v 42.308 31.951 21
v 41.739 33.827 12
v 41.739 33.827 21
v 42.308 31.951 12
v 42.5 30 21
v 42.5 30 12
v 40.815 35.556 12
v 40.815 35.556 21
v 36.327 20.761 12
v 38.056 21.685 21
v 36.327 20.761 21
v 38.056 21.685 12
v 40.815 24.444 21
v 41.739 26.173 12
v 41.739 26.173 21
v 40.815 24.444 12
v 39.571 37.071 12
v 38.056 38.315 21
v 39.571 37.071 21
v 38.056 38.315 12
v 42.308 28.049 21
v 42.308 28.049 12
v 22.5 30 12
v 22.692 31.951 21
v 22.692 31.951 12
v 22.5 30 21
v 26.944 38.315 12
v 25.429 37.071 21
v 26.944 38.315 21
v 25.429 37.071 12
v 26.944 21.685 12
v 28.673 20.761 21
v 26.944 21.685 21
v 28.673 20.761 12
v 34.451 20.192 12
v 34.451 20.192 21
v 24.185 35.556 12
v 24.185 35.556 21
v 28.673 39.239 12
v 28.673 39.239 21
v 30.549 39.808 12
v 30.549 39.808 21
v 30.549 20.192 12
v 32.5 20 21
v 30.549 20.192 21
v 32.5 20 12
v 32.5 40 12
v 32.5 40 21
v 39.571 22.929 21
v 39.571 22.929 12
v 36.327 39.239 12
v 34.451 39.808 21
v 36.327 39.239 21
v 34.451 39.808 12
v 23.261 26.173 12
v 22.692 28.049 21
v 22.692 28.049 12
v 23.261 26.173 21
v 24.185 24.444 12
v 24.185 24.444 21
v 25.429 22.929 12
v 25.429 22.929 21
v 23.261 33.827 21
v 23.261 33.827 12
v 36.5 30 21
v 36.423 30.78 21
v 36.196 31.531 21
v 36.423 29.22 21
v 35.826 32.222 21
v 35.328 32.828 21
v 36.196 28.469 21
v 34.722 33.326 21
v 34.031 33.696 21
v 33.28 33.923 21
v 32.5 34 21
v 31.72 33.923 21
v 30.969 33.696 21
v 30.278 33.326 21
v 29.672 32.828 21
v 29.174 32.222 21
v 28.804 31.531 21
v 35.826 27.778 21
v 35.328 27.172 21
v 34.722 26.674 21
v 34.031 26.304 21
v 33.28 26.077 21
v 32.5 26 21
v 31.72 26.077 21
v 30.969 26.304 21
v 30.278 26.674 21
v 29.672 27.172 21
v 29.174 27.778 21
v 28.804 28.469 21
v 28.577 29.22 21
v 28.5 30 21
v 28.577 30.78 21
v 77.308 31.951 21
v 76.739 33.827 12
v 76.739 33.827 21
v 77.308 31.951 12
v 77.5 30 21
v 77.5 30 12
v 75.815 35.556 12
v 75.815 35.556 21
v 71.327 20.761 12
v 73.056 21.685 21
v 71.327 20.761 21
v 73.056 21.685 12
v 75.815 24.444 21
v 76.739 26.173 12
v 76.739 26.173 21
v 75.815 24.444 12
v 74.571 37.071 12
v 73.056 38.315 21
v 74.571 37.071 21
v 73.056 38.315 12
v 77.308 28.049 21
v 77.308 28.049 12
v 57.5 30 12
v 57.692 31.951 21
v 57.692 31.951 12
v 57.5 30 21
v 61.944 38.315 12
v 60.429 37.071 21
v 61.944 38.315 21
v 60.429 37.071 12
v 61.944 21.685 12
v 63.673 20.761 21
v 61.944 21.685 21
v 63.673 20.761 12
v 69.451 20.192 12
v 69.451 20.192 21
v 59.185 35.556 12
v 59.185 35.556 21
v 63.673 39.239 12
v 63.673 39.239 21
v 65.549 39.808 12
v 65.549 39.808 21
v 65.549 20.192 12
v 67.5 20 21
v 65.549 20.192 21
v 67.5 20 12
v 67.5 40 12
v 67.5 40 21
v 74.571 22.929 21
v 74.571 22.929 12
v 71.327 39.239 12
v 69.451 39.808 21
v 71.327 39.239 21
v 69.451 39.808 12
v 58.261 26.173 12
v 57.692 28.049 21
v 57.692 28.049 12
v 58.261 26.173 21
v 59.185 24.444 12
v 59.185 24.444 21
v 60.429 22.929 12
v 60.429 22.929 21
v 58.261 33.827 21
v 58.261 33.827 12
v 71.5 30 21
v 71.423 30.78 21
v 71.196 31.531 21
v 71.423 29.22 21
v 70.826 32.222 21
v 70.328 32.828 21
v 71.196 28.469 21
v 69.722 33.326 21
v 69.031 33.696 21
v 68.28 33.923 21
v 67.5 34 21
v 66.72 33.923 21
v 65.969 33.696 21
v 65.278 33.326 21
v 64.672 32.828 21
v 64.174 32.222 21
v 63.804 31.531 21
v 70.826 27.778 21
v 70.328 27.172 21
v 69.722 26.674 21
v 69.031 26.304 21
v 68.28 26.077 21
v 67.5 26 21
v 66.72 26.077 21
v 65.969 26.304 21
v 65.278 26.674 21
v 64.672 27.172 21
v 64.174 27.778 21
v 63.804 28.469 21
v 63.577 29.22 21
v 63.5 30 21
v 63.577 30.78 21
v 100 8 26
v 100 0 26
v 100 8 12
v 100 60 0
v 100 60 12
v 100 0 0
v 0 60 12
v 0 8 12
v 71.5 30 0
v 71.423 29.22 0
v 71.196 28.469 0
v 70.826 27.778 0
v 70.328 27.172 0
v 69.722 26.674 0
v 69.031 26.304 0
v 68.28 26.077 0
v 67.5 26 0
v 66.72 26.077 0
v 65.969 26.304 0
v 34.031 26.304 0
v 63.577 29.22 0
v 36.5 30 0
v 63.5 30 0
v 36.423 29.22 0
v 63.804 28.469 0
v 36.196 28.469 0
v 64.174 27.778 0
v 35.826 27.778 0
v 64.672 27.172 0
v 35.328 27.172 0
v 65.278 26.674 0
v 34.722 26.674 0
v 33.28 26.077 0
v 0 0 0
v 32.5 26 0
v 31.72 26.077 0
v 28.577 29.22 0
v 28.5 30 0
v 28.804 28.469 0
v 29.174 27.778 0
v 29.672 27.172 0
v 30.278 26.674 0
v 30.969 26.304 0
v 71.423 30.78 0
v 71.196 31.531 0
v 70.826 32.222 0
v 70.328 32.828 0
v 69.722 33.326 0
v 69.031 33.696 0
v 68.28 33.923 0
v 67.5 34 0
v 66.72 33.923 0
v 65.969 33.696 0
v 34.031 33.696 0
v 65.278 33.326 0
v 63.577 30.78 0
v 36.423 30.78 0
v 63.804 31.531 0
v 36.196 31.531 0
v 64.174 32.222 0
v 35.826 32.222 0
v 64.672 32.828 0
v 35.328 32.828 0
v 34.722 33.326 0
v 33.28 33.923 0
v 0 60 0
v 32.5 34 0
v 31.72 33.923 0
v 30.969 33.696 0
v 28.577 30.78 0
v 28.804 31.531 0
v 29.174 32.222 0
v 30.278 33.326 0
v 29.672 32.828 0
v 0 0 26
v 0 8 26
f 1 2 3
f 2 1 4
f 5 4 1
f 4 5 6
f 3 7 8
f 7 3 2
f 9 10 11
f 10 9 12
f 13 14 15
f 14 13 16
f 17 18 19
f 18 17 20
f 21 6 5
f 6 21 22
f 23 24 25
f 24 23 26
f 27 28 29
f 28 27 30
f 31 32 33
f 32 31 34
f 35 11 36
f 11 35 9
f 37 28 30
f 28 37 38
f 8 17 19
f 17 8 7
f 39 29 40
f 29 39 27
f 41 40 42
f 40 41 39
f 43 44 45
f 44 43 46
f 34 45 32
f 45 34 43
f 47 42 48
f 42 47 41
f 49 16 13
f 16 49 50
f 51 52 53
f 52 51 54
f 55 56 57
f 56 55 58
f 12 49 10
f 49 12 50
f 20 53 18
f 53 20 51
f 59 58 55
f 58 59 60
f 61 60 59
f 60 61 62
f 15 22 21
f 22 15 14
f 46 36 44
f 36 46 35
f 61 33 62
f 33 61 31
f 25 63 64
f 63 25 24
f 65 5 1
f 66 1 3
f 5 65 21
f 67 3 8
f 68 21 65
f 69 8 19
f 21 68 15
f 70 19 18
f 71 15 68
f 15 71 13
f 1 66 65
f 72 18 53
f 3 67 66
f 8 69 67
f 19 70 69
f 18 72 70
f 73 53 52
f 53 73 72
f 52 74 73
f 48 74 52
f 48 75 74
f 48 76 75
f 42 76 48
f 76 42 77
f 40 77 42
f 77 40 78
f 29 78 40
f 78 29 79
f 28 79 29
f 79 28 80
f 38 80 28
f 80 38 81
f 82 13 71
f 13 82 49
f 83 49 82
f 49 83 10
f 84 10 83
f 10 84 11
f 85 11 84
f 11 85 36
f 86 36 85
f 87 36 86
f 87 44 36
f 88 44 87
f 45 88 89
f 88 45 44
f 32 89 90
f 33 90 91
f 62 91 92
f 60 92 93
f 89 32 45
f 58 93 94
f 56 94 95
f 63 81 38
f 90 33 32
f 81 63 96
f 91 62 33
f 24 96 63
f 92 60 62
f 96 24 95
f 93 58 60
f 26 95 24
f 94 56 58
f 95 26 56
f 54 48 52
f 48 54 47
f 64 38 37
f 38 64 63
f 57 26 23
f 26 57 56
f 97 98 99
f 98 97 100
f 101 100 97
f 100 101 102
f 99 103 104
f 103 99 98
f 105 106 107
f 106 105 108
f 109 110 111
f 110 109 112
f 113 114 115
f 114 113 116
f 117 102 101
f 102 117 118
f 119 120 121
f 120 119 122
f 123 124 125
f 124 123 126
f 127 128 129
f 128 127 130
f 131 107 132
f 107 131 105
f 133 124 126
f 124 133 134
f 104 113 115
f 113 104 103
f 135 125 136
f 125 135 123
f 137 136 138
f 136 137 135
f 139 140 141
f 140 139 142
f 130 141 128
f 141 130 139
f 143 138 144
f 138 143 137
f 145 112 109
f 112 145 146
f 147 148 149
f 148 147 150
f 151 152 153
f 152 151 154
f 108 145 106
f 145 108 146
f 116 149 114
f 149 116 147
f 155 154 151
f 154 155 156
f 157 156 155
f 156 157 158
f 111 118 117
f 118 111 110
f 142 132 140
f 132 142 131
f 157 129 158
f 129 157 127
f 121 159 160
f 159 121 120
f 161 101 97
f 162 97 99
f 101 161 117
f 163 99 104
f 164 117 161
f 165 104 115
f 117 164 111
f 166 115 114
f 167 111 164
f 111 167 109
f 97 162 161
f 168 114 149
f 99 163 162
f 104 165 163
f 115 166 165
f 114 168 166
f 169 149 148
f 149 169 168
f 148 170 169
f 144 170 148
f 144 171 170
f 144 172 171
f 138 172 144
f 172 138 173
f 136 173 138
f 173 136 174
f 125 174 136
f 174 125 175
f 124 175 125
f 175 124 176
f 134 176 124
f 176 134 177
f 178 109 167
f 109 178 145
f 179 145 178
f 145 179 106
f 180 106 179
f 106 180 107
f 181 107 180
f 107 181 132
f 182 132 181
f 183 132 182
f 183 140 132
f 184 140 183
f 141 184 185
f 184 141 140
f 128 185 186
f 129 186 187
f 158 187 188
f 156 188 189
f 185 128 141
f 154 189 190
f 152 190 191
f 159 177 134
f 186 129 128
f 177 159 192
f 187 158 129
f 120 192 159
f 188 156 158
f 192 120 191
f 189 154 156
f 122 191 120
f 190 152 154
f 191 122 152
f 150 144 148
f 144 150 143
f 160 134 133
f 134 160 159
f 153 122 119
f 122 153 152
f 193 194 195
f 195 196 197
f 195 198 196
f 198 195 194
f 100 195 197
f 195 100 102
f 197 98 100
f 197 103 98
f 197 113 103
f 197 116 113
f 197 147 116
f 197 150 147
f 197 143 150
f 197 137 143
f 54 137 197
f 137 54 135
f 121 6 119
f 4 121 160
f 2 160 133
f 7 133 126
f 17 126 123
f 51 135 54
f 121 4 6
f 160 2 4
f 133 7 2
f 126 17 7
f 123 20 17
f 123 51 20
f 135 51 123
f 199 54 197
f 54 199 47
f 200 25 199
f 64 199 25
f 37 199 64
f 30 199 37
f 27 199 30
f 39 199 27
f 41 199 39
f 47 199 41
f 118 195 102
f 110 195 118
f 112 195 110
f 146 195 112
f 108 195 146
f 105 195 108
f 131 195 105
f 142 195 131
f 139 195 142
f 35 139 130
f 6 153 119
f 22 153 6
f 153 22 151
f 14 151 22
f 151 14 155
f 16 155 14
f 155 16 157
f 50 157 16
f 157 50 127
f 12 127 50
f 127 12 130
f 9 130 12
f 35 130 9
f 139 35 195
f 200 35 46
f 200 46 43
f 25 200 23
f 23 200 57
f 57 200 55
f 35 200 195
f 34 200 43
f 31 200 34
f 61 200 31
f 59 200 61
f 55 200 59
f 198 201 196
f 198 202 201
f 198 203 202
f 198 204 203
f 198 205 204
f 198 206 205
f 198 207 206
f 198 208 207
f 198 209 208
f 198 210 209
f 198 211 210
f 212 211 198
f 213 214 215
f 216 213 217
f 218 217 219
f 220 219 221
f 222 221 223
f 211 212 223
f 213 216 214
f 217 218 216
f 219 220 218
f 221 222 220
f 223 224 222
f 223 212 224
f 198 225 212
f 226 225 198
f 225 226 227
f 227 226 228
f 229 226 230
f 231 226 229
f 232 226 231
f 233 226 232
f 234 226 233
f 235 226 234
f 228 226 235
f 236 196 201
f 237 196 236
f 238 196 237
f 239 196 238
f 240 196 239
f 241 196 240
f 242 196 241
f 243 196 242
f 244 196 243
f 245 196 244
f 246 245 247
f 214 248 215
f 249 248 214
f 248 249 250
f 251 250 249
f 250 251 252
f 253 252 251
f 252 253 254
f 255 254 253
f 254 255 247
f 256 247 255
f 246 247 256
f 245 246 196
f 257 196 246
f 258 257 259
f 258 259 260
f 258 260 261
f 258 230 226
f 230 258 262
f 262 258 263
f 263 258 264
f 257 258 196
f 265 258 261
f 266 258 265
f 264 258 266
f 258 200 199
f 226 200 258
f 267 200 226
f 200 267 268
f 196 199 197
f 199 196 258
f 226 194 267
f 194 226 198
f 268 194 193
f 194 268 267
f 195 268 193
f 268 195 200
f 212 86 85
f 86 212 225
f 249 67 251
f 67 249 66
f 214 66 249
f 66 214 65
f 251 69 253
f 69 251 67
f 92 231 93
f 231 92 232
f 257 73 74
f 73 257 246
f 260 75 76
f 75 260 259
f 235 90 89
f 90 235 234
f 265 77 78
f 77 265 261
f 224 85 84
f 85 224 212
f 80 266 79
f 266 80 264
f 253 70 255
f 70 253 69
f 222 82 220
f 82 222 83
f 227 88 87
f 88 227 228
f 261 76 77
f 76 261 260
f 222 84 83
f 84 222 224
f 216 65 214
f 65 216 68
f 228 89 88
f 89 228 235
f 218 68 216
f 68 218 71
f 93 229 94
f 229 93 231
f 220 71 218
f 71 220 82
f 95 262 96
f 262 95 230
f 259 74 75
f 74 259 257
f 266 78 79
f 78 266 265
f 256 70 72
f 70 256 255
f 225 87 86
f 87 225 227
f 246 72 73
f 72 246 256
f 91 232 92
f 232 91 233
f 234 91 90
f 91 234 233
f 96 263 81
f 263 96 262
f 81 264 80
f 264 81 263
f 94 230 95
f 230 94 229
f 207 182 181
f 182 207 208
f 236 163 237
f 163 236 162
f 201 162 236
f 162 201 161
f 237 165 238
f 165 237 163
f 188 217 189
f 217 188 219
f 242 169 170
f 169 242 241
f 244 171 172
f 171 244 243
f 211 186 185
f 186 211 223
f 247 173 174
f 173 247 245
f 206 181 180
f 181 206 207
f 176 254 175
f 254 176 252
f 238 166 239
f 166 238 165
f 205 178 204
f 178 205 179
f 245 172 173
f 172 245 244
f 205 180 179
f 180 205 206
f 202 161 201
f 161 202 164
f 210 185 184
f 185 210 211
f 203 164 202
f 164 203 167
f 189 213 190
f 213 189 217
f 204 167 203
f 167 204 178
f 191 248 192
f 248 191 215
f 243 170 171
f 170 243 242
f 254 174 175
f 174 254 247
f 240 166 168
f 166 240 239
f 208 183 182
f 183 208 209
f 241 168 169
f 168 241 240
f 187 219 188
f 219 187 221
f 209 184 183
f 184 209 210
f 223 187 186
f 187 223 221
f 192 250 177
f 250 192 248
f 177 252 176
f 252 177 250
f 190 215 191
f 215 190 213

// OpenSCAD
$fn = 32;

// ----------------------------------------------------------------------
// Drill jig: fence jig
// ----------------------------------------------------------------------

// --- parameters (mm) ---
plate_l = 100;            // plate length, X
plate_w = 60;             // plate width, Y
plate_t = 12;             // plate thickness
boss_d = 20;              // guide boss diameter
boss_h = 10;              // boss height above the plate
guide_d = 8;              // guide hole diameter
boss_pitch = 35;          // boss pitch
fence_h = 15;             // fence height above the plate
fence_t = 8;              // fence thickness

n_boss = 2;  // guide bosses
boss_x0 = (plate_l - (n_boss - 1) * boss_pitch) / 2;  // first boss X
boss_top = plate_t - 1 + boss_h;  // boss crown height
fence_top = plate_t - 1 + fence_h;  // fence crown height
total_h = max([fence_top, boss_top]);  // overall height

difference() {
  union() {
  cube([plate_l, plate_w, plate_t]);
  for (i = [0 : n_boss - 1])
    translate([boss_x0 + i * boss_pitch, plate_w / 2, plate_t - 1])
      cylinder(h = boss_h, d = boss_d);
  translate([0, 0, plate_t - 1]) cube([plate_l, fence_t, fence_h]);
  }
  for (i = [0 : n_boss - 1])
    translate([boss_x0 + i * boss_pitch, plate_w / 2, -1])
      cylinder(h = plate_t + boss_h, d = guide_d);
}
